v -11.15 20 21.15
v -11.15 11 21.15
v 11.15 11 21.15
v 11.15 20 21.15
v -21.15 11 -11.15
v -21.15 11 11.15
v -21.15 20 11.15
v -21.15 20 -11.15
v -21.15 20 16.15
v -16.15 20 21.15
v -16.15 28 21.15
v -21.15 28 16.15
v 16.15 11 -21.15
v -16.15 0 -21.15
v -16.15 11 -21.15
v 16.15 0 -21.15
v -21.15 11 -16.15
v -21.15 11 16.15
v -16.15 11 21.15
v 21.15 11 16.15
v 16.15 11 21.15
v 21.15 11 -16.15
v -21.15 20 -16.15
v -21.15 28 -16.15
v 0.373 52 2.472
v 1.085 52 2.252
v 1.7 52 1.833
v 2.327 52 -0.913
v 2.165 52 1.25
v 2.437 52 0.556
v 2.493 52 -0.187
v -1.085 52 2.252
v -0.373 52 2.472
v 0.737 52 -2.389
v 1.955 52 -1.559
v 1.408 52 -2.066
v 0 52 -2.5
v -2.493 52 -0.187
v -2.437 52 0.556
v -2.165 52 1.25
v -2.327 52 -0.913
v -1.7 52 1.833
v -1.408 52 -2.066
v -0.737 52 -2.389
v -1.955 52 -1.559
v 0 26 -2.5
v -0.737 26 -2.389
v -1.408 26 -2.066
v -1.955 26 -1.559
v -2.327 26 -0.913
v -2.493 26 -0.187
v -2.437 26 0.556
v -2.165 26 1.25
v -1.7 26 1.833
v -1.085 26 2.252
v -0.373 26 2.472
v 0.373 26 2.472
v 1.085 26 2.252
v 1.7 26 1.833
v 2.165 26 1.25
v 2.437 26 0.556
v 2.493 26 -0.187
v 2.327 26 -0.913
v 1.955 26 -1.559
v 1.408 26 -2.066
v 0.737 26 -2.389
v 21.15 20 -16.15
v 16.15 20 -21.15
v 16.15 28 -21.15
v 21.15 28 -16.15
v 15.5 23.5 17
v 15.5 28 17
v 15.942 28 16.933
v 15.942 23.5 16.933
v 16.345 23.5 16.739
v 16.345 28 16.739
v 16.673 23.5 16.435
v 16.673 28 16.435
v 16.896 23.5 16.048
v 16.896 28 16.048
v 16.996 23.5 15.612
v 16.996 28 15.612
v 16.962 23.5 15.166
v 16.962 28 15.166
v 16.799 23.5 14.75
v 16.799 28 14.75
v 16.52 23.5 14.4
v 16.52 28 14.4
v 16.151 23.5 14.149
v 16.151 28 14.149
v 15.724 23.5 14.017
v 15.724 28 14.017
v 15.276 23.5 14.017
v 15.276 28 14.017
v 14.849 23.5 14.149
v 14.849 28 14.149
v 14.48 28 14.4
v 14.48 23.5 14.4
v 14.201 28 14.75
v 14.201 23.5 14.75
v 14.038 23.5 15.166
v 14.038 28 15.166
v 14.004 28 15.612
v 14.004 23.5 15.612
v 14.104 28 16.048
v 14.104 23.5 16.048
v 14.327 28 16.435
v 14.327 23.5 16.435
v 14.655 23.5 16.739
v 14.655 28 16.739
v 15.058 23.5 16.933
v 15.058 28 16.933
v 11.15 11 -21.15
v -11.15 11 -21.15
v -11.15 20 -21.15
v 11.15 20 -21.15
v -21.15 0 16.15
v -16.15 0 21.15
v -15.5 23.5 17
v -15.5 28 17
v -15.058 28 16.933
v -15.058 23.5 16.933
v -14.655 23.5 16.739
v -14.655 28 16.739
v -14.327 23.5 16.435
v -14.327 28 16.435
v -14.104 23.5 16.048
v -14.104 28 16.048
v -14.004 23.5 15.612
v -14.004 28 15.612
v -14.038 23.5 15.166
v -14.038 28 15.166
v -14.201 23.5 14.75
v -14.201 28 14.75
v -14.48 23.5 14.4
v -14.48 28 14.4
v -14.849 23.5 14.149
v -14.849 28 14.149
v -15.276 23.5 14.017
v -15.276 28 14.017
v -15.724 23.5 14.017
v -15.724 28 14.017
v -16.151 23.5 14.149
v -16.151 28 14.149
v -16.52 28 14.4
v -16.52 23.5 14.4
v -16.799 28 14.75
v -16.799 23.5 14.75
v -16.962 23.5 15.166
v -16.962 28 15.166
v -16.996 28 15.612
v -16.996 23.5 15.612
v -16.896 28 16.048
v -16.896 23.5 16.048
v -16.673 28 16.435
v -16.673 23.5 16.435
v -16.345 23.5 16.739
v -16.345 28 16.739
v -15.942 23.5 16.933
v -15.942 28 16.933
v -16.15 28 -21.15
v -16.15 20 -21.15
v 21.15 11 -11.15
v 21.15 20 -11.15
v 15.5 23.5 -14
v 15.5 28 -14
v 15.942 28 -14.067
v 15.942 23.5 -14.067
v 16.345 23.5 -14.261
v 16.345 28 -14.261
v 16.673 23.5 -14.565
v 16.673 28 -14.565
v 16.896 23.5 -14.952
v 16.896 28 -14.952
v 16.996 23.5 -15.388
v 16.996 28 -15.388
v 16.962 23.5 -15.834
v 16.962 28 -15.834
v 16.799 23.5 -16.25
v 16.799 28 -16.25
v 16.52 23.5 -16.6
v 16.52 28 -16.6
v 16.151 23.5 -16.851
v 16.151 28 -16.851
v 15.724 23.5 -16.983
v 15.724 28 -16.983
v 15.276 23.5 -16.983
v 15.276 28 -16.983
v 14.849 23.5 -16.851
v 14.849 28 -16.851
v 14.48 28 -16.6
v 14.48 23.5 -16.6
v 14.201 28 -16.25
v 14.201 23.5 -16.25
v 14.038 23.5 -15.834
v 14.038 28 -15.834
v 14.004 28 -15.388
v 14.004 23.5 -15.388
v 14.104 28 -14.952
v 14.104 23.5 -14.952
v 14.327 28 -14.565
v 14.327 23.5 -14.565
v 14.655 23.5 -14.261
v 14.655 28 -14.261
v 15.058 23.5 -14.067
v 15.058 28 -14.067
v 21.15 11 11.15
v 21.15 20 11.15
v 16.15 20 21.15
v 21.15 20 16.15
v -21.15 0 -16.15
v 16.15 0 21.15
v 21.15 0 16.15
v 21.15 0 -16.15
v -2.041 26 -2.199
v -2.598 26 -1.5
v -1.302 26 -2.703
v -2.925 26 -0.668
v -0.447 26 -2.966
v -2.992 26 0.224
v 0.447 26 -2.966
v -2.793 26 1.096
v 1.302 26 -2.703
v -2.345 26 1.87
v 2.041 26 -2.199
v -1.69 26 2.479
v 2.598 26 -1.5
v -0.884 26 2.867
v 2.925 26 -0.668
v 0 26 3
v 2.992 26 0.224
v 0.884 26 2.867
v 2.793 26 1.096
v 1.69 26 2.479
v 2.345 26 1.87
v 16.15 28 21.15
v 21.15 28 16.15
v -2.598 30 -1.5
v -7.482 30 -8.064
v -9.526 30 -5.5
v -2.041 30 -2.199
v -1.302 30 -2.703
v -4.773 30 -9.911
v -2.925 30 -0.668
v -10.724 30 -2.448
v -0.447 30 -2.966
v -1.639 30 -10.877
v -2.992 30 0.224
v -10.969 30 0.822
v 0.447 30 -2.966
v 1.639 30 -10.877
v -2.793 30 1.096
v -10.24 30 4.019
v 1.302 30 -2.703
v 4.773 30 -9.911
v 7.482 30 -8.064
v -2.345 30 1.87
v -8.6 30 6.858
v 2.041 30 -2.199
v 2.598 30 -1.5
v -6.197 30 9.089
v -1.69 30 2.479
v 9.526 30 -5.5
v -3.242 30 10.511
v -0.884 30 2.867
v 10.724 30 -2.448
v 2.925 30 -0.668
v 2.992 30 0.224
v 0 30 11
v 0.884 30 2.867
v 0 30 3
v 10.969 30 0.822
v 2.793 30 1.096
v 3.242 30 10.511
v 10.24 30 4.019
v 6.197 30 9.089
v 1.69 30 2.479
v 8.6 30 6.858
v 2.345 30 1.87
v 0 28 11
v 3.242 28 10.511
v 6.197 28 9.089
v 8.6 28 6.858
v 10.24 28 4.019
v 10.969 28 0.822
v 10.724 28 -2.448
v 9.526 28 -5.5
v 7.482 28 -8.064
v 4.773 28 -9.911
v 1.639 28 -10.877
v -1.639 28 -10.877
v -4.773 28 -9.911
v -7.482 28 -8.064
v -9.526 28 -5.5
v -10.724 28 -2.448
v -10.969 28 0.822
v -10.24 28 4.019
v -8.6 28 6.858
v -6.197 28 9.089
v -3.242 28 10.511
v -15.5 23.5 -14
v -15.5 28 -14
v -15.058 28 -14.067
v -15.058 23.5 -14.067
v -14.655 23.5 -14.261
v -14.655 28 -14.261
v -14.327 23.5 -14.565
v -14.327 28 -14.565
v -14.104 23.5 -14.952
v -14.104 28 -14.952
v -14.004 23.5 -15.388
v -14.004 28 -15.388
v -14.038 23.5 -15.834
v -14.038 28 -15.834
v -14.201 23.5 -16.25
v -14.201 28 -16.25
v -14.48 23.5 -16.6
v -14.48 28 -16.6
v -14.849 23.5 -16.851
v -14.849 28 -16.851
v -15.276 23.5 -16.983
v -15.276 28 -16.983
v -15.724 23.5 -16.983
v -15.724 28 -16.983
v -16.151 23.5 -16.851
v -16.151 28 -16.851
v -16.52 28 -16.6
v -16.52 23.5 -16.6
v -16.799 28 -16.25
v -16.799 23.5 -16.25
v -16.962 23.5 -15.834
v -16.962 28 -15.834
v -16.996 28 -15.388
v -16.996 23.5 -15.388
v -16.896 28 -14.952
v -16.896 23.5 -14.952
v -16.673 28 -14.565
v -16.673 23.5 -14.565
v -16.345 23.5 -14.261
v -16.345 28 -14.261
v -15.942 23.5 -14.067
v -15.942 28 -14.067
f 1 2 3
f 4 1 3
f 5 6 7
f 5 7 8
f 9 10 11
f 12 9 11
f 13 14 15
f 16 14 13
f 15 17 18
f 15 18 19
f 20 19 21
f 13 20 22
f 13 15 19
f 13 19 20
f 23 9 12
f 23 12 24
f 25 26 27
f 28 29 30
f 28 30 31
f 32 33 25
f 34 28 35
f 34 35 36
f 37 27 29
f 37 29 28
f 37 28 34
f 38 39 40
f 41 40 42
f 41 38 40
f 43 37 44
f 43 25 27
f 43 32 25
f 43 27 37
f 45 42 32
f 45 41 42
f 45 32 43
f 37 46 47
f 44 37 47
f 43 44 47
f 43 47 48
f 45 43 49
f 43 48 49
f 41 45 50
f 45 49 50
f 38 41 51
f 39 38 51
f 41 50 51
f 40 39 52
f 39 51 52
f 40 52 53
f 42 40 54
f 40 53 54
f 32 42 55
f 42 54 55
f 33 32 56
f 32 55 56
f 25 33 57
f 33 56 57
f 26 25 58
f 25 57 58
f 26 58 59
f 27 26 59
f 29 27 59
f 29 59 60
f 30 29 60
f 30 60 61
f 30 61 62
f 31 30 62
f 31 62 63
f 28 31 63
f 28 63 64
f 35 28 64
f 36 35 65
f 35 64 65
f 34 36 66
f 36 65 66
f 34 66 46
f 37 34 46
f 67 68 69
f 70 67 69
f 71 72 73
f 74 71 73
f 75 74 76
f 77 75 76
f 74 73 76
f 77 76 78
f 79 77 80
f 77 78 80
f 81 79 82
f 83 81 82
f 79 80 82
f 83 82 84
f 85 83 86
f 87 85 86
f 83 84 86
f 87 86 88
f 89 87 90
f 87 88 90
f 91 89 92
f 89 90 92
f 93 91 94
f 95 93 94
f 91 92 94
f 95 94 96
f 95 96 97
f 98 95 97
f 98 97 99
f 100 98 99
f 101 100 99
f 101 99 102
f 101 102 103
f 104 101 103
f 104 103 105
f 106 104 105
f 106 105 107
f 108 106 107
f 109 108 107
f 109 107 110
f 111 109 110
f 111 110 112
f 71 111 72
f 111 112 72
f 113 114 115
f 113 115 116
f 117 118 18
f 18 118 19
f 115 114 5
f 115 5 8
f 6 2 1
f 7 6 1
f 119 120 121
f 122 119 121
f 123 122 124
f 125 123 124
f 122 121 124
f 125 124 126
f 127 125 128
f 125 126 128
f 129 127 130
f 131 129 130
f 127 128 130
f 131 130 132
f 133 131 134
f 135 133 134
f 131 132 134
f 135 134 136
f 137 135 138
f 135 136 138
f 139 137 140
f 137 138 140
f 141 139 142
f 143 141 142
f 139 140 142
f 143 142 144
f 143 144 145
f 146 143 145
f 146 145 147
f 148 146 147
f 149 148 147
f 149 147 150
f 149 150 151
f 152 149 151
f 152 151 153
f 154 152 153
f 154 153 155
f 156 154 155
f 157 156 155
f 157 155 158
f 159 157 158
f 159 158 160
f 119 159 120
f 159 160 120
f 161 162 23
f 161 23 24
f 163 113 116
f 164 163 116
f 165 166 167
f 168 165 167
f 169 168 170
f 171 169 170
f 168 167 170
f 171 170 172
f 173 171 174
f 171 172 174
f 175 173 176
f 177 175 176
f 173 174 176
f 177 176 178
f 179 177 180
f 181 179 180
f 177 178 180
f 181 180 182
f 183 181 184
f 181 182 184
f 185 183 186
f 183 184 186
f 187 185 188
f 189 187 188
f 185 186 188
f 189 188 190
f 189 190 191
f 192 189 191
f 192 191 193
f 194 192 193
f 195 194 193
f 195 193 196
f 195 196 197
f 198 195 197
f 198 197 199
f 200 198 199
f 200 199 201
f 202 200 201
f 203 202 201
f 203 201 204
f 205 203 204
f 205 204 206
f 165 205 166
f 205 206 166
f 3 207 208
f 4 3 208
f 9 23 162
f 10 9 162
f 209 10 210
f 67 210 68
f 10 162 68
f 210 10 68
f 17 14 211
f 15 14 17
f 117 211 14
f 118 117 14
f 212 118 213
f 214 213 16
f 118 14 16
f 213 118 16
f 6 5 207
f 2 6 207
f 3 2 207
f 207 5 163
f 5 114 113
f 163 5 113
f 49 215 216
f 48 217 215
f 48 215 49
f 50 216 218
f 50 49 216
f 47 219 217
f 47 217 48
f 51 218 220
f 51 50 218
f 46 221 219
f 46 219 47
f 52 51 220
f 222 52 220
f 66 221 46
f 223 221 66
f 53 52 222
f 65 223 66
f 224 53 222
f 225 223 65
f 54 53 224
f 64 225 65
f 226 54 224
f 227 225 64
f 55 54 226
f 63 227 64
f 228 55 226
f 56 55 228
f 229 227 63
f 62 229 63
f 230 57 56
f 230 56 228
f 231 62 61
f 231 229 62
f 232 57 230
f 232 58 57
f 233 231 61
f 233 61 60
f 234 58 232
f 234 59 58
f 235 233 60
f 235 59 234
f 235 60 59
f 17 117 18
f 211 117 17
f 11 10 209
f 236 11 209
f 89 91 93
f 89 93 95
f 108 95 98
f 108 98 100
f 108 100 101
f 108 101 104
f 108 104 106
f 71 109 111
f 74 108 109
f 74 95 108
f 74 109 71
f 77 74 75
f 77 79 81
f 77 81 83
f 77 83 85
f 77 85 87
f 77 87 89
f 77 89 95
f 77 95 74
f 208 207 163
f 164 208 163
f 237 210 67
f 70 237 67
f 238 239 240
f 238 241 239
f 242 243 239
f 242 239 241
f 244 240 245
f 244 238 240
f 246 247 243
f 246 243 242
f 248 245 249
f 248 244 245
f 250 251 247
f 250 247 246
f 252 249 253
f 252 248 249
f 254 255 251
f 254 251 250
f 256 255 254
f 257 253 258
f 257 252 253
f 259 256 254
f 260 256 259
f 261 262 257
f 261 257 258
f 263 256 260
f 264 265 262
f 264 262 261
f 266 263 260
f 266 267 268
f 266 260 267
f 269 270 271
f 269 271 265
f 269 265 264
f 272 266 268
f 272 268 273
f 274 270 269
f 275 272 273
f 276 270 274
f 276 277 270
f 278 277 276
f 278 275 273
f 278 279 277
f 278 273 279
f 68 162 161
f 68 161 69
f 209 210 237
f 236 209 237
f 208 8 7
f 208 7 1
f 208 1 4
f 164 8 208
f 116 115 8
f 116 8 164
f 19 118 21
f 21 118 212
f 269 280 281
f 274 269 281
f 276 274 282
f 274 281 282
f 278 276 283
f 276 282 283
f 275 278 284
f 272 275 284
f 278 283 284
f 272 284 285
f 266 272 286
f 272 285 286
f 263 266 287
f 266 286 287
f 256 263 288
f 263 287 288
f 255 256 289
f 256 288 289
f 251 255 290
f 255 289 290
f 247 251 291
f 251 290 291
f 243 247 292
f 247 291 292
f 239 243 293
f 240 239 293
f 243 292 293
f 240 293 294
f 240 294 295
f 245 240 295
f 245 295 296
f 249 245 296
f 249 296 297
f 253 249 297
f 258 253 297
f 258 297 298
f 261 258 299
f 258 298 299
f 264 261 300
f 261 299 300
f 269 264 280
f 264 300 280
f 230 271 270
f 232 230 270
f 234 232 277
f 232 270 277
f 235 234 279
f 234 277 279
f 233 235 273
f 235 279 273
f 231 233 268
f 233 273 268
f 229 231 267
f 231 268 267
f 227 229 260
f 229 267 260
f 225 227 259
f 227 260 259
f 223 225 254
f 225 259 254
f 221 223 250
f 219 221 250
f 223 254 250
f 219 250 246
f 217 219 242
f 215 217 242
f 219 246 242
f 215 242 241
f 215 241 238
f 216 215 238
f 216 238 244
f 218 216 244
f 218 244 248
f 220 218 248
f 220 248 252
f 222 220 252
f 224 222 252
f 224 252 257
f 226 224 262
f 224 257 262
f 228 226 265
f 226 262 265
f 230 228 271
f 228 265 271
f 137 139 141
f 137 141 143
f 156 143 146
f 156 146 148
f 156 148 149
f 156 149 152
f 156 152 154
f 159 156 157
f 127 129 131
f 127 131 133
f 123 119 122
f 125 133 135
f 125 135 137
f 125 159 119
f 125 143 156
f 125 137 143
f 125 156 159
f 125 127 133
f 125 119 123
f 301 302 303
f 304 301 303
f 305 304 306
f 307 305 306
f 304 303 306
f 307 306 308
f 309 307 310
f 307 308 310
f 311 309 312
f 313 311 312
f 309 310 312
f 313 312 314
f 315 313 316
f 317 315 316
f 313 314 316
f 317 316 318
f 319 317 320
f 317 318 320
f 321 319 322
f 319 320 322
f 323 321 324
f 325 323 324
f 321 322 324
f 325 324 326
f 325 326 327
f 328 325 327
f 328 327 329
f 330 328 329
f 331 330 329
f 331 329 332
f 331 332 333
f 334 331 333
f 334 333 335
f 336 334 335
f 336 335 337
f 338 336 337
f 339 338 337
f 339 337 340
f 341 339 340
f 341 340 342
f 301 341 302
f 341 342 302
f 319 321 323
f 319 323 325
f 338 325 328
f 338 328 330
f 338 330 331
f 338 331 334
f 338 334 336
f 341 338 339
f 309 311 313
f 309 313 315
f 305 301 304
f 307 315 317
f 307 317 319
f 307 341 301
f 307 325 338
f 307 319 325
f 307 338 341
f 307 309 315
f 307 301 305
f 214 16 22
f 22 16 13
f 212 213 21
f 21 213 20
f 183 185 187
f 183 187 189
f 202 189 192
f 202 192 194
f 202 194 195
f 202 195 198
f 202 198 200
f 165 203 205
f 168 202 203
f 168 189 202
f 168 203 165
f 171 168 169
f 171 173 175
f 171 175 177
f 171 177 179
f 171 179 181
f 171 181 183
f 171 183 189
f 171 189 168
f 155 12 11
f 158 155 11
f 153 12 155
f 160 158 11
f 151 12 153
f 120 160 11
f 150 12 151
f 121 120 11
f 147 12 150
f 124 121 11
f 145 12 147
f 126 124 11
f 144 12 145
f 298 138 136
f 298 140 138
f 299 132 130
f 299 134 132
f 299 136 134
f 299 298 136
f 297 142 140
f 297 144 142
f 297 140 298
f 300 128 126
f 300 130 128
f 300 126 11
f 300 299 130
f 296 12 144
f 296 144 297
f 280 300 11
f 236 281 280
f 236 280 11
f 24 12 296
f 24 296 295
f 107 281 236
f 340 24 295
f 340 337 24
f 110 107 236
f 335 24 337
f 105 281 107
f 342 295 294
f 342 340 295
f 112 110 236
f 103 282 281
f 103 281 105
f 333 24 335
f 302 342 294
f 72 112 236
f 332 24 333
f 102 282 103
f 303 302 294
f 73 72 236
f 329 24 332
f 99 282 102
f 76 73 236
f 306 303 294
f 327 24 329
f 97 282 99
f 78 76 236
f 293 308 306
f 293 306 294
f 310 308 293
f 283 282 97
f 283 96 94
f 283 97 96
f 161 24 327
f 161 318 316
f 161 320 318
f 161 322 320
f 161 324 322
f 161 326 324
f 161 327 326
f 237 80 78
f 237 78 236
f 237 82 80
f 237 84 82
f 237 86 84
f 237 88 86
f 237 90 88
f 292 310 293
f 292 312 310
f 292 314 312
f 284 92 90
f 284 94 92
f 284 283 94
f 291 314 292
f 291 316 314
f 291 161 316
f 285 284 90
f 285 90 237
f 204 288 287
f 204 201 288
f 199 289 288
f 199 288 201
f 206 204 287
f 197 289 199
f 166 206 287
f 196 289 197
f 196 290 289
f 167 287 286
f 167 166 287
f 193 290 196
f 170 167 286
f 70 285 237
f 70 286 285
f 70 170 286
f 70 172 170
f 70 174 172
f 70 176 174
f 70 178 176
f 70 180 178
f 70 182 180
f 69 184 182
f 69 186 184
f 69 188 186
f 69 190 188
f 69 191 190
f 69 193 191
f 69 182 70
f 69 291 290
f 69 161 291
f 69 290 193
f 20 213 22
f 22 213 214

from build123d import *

# Parameters (mm, degrees)
SKETCH1_W           = 42.3
SKETCH1_H           = 42.3
BOSS_EXTRUDE1_DEPTH = 11
SKETCH2_W           = 42.3
SKETCH2_H           = 42.3
BOSS_EXTRUDE2_DEPTH = 9
SKETCH3_W           = 42.3
SKETCH3_H           = 42.3
BOSS_EXTRUDE3_DEPTH = 8
CHAMFER1_SIZE       = 10
CHAMFER2_SIZE       = 5
CHAMFER3_SIZE       = 5
SKETCH4_R           = 11
BOSS_EXTRUDE4_DEPTH = 2
SKETCH5_R           = 3
CUT_EXTRUDE1_DEPTH  = 4
SKETCH6_R           = 2.5
BOSS_EXTRUDE5_DEPTH = 26
SKETCH7_R           = 1.5
CUT_EXTRUDE2_DEPTH  = 4.5


with BuildPart() as part:
    # Sketch1 → Boss-Extrude1 (new body)
    with BuildSketch(Plane(origin=(0, 0, 0), x_dir=(1, 0, 0), z_dir=(0, 1, 0))):
        Rectangle(SKETCH1_W, SKETCH1_H)
    extrude(amount=BOSS_EXTRUDE1_DEPTH)

    # Chamfer3
    chamfer3_edges = [part.edges().sort_by_distance(p)[0] for p in [
        (-21.15, 5.5, -21.15),
        (21.15, 5.5, -21.15),
        (21.15, 5.5, 21.15),
        (-21.15, 5.5, 21.15),
    ]]
    chamfer(chamfer3_edges, length=CHAMFER3_SIZE)


with BuildPart() as body_2:
    # Sketch2 → Boss-Extrude2 (new body)
    with BuildSketch(Plane(origin=(0, 11, 0), x_dir=(1, 0, 0), z_dir=(0, 1, 0))):
        Rectangle(SKETCH2_W, SKETCH2_H)
    extrude(amount=BOSS_EXTRUDE2_DEPTH)

    # Chamfer1
    chamfer1_edges = [body_2.edges().sort_by_distance(p)[0] for p in [
        (-21.15, 15.5, -21.15),
        (21.15, 15.5, -21.15),
        (21.15, 15.5, 21.15),
        (-21.15, 15.5, 21.15),
    ]]
    chamfer(chamfer1_edges, length=CHAMFER1_SIZE)


with BuildPart() as body_3:
    # Sketch3 → Boss-Extrude3 (new body)
    with BuildSketch(Plane(origin=(0, 20, 0), x_dir=(1, 0, 0), z_dir=(0, 1, 0))):
        Rectangle(SKETCH3_W, SKETCH3_H)
    extrude(amount=BOSS_EXTRUDE3_DEPTH)

    # Chamfer2
    chamfer2_edges = [body_3.edges().sort_by_distance(p)[0] for p in [
        (-21.15, 24, -21.15),
        (21.15, 24, -21.15),
        (21.15, 24, 21.15),
        (-21.15, 24, 21.15),
    ]]
    chamfer(chamfer2_edges, length=CHAMFER2_SIZE)

    # Sketch4 → Boss-Extrude4 (add)
    with BuildSketch(Plane(origin=(0, 28, 0), x_dir=(1, 0, 0), z_dir=(0, 1, 0))):
        with Locations(Location((0, 0, 0), (0, 0, 270))):
            Circle(SKETCH4_R)
    extrude(amount=BOSS_EXTRUDE4_DEPTH)

    # Sketch5 → Cut-Extrude1 (cut)
    with BuildSketch(Plane(origin=(0, 30, 0), x_dir=(1, 0, 0), z_dir=(0, 1, 0))):
        with Locations(Location((0, 0, 0), (0, 0, 270))):
            Circle(SKETCH5_R)
    extrude(amount=-CUT_EXTRUDE1_DEPTH, mode=Mode.SUBTRACT)

    # Sketch6 → Boss-Extrude5 (add)
    with BuildSketch(Plane(origin=(0, 26, 0), x_dir=(1, 0, 0), z_dir=(0, 1, 0))):
        with Locations(Location((0, 0, 0), (0, 0, 90))):
            Circle(SKETCH6_R)
    extrude(amount=BOSS_EXTRUDE5_DEPTH)

    # Sketch7 → Cut-Extrude2 (cut)
    with BuildSketch(Plane(origin=(0, 28, 0), x_dir=(1, 0, 0), z_dir=(0, 1, 0))):
        with Locations(Location((-15.5, -15.5, 0), (0, 0, 270))):
            Circle(SKETCH7_R)
        with Locations(Location((-15.5, 15.5, 0), (0, 0, 270))):
            Circle(SKETCH7_R)
        with Locations(Location((15.5, 15.5, 0), (0, 0, 270))):
            Circle(SKETCH7_R)
        with Locations(Location((15.5, -15.5, 0), (0, 0, 270))):
            Circle(SKETCH7_R)
    extrude(amount=-CUT_EXTRUDE2_DEPTH, mode=Mode.SUBTRACT)


solid = Compound([part.part, body_2.part, body_3.part])
